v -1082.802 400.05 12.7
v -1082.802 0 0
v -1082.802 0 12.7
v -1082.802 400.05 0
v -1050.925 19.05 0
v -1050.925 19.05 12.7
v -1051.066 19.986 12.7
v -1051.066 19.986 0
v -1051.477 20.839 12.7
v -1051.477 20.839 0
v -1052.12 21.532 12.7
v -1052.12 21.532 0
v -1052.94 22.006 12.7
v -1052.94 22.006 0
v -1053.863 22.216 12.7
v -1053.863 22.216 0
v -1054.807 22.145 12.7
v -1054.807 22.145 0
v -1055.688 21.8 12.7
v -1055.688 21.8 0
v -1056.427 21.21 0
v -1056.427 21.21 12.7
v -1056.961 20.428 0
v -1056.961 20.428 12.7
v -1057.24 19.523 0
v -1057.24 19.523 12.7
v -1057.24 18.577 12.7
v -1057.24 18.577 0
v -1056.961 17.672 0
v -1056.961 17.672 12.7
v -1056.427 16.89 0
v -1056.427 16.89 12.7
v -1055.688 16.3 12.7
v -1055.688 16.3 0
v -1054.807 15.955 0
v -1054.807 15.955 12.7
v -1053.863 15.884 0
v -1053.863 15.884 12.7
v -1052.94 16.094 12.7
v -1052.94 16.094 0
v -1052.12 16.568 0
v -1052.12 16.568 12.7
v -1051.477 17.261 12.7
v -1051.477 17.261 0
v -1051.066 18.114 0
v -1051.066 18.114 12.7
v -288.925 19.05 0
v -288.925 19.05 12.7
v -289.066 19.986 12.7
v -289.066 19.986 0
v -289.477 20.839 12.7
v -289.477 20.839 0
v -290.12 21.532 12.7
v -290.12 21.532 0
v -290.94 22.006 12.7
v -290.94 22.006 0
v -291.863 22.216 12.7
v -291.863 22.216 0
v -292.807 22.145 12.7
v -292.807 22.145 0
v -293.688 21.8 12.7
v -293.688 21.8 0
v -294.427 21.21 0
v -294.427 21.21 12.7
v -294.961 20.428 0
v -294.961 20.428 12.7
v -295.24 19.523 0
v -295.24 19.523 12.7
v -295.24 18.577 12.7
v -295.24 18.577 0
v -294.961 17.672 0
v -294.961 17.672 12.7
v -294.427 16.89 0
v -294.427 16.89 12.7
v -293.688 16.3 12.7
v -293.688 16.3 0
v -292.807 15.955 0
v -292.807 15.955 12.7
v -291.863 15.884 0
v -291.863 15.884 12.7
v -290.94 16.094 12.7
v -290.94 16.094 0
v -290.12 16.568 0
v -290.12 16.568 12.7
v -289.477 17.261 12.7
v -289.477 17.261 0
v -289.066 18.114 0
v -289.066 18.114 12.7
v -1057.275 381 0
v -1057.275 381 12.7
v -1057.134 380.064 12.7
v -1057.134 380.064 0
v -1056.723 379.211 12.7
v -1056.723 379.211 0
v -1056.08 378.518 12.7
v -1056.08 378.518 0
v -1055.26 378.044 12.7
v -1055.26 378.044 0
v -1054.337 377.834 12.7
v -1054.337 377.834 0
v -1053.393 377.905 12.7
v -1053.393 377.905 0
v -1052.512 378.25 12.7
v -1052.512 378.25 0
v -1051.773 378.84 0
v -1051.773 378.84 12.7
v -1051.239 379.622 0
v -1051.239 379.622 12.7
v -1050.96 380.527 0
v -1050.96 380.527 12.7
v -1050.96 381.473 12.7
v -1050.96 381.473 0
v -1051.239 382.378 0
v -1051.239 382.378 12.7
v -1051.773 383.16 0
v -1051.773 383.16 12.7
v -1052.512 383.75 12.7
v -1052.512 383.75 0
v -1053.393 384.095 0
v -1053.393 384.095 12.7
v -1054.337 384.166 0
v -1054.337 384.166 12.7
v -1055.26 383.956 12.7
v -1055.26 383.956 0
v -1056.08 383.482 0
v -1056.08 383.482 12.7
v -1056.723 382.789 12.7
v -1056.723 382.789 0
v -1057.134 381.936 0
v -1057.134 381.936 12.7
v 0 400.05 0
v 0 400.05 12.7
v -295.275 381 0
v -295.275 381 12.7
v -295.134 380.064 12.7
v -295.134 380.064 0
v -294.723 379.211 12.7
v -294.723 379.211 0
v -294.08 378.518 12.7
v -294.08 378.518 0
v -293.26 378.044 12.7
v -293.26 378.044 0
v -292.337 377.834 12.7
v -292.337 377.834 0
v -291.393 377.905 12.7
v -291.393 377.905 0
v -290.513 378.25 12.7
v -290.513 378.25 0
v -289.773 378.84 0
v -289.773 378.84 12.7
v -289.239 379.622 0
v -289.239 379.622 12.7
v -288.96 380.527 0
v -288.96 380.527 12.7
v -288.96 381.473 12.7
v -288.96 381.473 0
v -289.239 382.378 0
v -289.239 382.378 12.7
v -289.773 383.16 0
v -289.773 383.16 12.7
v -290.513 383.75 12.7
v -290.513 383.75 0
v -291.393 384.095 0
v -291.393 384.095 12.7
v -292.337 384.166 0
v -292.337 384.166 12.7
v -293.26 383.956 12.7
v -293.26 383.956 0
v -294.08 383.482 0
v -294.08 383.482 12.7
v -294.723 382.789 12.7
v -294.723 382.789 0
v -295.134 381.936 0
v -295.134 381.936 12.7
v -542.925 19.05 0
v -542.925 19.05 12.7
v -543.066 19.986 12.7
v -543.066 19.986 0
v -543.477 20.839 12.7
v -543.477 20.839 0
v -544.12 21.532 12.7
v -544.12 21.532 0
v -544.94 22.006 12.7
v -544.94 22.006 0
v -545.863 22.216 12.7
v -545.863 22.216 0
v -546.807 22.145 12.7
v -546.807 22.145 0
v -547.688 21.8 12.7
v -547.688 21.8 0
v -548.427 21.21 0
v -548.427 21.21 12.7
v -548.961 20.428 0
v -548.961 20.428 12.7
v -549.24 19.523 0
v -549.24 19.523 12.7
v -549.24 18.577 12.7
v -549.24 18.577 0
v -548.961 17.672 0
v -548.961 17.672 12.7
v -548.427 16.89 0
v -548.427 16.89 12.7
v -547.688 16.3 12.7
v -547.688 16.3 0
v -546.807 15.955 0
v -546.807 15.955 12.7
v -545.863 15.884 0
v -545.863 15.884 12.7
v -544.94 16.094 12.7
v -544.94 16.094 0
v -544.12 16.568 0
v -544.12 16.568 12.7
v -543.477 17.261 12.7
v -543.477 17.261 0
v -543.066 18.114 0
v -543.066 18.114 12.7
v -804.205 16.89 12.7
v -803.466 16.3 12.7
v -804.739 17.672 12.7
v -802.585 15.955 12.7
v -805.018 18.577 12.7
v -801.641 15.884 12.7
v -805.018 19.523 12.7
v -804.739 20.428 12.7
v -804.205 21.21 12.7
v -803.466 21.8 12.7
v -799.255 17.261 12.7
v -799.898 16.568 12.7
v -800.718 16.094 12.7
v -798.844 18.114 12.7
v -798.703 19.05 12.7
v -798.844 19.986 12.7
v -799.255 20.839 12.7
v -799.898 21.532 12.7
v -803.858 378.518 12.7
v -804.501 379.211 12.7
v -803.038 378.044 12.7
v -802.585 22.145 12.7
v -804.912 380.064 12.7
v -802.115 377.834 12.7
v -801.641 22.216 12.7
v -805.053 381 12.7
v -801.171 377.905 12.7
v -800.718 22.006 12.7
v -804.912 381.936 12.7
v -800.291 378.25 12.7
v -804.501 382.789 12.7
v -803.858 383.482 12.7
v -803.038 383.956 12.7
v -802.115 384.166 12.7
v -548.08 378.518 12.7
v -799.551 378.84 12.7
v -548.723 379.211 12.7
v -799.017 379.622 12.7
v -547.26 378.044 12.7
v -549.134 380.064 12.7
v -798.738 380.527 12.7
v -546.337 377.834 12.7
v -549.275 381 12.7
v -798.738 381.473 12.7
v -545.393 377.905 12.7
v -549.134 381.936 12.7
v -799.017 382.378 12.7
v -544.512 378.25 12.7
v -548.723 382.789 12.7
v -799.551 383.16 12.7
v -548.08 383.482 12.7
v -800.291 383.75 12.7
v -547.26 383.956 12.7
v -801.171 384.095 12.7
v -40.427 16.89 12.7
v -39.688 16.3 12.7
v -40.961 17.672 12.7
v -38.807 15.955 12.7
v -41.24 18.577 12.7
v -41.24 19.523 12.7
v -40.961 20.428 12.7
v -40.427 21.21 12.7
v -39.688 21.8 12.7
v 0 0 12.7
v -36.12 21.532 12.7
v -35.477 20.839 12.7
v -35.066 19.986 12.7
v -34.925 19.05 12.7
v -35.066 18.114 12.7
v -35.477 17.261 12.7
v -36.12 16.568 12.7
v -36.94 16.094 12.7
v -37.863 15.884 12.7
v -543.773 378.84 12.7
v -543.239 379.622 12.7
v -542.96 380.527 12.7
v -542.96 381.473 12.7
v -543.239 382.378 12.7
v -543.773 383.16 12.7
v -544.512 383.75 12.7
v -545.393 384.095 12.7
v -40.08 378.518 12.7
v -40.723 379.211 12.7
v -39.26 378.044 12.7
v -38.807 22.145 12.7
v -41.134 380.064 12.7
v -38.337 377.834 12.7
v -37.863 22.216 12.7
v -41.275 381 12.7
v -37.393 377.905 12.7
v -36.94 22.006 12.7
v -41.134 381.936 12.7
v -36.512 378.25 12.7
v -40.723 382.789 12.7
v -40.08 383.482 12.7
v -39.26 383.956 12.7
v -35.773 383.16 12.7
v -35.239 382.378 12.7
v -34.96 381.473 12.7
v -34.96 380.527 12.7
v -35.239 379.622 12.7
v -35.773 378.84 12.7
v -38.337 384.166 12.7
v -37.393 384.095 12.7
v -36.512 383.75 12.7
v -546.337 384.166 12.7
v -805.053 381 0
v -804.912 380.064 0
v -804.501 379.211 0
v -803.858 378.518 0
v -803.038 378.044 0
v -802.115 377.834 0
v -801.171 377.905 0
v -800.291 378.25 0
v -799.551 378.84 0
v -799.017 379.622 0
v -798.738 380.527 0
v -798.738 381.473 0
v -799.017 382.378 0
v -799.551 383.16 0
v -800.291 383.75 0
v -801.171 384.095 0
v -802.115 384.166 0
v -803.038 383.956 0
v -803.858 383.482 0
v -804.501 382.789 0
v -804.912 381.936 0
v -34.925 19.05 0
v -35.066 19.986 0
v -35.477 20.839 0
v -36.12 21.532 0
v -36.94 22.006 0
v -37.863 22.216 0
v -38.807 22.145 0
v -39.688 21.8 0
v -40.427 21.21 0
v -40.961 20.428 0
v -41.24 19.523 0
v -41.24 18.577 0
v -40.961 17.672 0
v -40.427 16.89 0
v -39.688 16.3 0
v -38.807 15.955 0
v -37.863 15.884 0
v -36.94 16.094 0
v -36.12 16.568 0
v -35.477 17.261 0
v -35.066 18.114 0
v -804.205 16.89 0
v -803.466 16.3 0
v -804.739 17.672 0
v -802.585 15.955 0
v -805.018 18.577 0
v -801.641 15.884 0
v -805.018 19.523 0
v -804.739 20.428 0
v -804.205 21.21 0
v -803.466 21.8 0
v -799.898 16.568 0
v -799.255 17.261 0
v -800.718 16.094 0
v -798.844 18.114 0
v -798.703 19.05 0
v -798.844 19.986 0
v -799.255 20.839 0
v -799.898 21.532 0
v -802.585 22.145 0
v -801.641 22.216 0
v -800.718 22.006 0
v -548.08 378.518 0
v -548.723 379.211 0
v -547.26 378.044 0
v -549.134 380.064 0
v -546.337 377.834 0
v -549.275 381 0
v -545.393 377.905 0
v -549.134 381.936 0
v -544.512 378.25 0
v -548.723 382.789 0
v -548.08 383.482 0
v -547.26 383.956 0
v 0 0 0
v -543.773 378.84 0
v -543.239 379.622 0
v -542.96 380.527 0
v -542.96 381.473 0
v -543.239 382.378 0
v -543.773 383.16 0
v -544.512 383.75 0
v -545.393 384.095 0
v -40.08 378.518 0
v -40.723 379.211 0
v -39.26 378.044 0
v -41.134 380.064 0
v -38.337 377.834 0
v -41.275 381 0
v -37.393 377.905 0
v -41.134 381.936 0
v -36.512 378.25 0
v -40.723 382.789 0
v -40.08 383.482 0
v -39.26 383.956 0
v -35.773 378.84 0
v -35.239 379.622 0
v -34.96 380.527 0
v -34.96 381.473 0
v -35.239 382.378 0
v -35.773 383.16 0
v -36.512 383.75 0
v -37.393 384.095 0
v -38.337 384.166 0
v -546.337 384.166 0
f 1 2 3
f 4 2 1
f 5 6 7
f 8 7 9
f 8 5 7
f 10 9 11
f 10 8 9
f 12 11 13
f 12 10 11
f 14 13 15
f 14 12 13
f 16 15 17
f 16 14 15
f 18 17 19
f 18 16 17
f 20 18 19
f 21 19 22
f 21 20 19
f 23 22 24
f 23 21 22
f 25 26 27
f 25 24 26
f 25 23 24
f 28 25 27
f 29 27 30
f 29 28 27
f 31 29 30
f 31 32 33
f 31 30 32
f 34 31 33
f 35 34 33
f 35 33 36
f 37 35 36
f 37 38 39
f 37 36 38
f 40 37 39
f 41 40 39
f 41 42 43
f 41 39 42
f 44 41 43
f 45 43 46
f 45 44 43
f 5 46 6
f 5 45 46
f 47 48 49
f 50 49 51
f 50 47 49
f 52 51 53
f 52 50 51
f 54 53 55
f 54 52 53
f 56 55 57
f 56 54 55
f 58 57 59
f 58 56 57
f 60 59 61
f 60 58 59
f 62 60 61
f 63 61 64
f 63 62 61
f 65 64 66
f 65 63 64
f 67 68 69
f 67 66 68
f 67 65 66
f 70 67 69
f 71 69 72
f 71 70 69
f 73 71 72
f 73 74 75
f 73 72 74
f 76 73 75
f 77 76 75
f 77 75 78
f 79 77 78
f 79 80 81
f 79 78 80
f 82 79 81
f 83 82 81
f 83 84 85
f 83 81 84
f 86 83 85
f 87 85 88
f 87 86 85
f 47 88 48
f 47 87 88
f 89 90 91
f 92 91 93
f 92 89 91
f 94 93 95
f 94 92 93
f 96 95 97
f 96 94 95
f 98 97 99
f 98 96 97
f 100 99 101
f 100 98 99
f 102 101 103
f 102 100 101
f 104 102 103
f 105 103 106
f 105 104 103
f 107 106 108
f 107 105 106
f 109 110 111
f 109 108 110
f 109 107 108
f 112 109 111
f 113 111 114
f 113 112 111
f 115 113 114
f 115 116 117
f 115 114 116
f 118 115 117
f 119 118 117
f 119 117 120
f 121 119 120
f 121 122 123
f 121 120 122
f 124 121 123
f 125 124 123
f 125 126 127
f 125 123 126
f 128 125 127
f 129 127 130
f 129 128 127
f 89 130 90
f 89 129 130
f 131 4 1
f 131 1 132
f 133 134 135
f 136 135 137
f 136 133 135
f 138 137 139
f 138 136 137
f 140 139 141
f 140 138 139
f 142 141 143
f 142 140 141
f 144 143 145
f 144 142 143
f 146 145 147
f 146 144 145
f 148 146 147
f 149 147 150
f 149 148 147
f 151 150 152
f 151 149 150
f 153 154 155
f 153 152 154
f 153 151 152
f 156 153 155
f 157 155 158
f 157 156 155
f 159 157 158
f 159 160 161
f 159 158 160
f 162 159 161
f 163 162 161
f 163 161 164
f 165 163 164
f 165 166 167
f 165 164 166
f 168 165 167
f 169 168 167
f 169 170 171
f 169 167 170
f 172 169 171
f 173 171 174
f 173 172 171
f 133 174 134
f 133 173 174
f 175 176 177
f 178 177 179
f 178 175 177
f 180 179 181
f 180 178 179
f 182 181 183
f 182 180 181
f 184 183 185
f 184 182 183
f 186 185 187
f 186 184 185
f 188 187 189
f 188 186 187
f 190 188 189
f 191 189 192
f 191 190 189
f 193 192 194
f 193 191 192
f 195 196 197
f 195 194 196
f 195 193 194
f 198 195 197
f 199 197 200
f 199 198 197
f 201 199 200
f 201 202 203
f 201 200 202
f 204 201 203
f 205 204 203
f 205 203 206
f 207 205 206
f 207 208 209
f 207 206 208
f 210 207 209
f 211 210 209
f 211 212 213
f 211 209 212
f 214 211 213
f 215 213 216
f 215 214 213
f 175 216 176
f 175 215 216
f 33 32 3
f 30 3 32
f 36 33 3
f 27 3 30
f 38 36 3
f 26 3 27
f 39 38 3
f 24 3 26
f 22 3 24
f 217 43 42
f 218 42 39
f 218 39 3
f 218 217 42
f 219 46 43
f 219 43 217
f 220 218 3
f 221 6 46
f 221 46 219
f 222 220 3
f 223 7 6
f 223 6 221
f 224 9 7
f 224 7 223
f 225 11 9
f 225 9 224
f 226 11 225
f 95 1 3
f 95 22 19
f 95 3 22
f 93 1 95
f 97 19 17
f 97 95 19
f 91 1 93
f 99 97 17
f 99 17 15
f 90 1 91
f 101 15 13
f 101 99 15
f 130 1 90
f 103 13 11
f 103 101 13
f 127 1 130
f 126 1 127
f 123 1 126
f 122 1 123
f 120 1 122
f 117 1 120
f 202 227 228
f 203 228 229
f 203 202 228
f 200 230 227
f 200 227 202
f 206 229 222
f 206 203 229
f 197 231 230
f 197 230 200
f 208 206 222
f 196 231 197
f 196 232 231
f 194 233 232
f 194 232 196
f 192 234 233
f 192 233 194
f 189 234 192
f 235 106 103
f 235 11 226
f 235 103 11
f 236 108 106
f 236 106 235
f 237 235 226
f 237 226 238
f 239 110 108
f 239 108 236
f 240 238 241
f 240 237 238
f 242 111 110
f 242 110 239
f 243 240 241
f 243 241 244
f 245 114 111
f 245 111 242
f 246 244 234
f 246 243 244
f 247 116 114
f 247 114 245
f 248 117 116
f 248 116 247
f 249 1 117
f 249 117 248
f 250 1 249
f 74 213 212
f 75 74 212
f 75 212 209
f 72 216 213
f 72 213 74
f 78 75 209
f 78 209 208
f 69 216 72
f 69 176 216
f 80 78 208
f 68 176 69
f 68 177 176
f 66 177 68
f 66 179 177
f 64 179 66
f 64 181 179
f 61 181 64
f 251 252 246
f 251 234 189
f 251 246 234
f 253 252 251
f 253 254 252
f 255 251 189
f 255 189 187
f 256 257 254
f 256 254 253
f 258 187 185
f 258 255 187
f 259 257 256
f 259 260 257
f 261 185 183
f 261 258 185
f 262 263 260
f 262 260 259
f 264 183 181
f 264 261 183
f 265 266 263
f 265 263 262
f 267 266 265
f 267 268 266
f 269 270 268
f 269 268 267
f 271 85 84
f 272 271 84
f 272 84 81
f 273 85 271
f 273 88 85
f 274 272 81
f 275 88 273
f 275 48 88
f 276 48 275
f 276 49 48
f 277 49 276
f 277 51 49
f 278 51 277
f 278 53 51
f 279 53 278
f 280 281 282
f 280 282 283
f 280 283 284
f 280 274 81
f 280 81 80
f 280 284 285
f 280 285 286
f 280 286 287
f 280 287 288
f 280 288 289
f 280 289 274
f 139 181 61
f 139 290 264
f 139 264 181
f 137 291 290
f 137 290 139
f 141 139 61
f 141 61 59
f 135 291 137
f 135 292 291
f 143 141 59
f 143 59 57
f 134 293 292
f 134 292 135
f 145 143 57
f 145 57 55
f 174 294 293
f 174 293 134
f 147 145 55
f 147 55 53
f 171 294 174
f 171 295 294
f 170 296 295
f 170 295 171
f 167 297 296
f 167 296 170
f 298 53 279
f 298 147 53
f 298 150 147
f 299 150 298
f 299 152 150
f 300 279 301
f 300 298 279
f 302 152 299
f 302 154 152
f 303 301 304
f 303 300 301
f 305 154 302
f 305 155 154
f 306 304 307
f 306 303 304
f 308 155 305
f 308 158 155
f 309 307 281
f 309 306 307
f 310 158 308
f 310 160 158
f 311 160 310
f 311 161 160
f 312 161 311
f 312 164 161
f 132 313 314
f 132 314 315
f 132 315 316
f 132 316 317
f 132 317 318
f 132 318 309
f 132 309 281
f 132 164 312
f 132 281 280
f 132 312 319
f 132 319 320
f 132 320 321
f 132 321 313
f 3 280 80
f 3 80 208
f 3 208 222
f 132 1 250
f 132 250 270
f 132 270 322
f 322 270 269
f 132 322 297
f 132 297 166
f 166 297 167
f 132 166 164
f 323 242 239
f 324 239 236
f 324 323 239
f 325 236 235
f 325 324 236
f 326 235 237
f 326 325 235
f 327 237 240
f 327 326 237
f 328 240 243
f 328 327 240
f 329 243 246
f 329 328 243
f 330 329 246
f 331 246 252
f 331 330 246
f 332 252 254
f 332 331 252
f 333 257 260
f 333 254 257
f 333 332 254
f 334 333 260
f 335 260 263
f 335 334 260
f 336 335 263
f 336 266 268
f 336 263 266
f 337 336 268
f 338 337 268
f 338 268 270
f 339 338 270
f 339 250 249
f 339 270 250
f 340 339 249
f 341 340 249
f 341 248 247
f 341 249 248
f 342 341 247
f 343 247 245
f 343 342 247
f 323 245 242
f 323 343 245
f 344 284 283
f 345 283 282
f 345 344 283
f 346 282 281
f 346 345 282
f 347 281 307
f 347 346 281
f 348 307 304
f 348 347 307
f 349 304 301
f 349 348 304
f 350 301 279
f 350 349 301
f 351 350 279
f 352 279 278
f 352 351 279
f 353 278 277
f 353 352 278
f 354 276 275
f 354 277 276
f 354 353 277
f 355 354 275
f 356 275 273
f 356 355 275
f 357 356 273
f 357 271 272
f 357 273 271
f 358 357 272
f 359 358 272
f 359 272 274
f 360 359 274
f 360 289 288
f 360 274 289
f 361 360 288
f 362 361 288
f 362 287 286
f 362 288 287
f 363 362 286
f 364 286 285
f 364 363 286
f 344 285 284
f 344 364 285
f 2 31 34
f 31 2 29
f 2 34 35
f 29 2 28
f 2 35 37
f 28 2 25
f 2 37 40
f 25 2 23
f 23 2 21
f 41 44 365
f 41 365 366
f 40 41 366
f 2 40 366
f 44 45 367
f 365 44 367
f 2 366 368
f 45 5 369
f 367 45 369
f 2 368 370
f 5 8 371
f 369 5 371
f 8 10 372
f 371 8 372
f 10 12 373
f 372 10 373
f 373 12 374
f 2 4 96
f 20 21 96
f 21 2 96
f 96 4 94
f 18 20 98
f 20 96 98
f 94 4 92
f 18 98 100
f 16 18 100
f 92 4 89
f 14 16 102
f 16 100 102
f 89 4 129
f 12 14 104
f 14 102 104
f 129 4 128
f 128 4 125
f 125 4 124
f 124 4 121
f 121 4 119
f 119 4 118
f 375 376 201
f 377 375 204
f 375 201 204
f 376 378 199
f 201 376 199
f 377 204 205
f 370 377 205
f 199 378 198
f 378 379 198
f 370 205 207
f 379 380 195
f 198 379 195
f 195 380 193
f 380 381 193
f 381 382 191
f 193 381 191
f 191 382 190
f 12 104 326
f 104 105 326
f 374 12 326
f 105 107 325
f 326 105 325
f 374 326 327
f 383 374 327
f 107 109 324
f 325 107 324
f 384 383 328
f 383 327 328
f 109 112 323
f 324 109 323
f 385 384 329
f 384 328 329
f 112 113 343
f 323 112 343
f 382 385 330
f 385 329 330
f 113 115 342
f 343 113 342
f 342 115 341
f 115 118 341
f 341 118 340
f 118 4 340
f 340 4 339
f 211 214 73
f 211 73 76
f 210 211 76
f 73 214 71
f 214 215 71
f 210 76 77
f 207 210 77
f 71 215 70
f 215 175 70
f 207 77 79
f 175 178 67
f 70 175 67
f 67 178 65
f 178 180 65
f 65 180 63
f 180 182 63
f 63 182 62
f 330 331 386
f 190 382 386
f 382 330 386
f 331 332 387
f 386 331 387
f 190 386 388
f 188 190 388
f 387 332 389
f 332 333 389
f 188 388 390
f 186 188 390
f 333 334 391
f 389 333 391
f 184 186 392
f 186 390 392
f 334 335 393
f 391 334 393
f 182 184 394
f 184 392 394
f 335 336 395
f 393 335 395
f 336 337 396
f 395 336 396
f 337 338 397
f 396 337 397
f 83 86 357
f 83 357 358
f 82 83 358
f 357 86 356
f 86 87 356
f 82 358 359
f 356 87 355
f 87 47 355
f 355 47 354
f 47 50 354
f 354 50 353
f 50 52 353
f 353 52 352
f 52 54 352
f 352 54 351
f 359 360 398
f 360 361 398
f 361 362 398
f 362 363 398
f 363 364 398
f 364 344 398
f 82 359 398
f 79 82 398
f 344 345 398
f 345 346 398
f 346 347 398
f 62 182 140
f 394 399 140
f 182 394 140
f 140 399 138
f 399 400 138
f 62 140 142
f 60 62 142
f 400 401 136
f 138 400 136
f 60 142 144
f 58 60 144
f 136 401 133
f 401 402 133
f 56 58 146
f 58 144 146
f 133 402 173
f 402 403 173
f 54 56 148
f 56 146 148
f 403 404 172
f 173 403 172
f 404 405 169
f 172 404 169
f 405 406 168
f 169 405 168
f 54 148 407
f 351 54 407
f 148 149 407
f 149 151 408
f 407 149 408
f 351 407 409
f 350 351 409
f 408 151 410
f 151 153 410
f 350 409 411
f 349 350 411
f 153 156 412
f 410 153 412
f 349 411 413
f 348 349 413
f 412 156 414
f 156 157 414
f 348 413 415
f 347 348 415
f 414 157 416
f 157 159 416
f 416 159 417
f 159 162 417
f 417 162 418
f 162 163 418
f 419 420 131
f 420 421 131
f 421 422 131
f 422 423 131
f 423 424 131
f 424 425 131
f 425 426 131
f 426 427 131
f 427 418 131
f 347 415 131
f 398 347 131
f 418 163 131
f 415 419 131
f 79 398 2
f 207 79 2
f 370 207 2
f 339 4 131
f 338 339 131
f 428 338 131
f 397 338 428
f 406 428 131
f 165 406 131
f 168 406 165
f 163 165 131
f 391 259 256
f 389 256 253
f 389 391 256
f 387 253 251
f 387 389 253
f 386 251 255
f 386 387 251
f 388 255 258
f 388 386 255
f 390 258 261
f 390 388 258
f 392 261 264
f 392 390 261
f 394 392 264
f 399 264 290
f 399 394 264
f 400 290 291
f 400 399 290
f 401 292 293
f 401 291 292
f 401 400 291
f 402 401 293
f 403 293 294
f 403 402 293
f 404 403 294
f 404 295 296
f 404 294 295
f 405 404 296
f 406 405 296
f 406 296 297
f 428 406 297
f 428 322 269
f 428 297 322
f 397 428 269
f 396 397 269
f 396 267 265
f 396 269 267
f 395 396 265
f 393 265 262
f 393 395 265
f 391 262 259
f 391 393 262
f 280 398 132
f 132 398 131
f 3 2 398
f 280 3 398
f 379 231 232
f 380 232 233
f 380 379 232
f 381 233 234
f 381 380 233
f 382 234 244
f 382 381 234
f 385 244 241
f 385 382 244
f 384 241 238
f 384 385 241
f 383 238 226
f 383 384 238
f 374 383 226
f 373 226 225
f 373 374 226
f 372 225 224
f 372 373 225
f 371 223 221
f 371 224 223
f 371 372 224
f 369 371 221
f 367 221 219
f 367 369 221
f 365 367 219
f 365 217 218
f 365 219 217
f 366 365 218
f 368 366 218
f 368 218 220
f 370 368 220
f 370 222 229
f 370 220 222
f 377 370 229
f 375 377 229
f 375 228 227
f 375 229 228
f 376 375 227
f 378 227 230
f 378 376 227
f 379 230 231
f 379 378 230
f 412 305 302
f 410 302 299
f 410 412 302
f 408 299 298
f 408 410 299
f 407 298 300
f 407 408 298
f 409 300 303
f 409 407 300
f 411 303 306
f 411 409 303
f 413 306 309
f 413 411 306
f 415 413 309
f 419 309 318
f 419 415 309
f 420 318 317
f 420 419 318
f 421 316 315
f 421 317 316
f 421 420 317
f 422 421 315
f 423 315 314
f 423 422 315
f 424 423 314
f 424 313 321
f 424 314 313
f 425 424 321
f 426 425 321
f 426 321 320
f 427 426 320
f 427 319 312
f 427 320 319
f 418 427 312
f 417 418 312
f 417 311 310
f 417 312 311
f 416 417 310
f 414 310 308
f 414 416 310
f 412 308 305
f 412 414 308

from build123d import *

# Parameters (mm, degrees)
SKETCH1_W           = 1082.802
SKETCH1_H           = 400.05
BOSS_EXTRUDE1_DEPTH = 12.7
SKETCH2_R           = 3.175
CUT_EXTRUDE1_DEPTH  = 1155.409573637


with BuildPart() as part:
    # Sketch1 → Boss-Extrude1 (new body)
    with BuildSketch(Plane.XY):
        with Locations((-541.401, 200.025)):
            Rectangle(SKETCH1_W, SKETCH1_H)
    extrude(amount=BOSS_EXTRUDE1_DEPTH)

    # Sketch2 (on Front Plane) → Cut-Extrude1 (cut, through all)
    with BuildSketch(Plane.XY):
        with Locations((-1054.1, 19.05)):
            Circle(SKETCH2_R)
        with Locations((-801.878, 19.05)):
            Circle(SKETCH2_R)
        with Locations((-546.1, 19.05)):
            Circle(SKETCH2_R)
        with Locations((-292.1, 19.05)):
            Circle(SKETCH2_R)
        with Locations((-38.1, 19.05)):
            Circle(SKETCH2_R)
        with Locations(Location((-38.1, 381, 0), (0, 0, 180))):
            Circle(SKETCH2_R)
        with Locations(Location((-292.1, 381, 0), (0, 0, 180))):
            Circle(SKETCH2_R)
        with Locations(Location((-546.1, 381, 0), (0, 0, 180))):
            Circle(SKETCH2_R)
        with Locations(Location((-801.878, 381, 0), (0, 0, 180))):
            Circle(SKETCH2_R)
        with Locations(Location((-1054.1, 381, 0), (0, 0, 180))):
            Circle(SKETCH2_R)
    extrude(amount=CUT_EXTRUDE1_DEPTH, mode=Mode.SUBTRACT)


solid = part.part
